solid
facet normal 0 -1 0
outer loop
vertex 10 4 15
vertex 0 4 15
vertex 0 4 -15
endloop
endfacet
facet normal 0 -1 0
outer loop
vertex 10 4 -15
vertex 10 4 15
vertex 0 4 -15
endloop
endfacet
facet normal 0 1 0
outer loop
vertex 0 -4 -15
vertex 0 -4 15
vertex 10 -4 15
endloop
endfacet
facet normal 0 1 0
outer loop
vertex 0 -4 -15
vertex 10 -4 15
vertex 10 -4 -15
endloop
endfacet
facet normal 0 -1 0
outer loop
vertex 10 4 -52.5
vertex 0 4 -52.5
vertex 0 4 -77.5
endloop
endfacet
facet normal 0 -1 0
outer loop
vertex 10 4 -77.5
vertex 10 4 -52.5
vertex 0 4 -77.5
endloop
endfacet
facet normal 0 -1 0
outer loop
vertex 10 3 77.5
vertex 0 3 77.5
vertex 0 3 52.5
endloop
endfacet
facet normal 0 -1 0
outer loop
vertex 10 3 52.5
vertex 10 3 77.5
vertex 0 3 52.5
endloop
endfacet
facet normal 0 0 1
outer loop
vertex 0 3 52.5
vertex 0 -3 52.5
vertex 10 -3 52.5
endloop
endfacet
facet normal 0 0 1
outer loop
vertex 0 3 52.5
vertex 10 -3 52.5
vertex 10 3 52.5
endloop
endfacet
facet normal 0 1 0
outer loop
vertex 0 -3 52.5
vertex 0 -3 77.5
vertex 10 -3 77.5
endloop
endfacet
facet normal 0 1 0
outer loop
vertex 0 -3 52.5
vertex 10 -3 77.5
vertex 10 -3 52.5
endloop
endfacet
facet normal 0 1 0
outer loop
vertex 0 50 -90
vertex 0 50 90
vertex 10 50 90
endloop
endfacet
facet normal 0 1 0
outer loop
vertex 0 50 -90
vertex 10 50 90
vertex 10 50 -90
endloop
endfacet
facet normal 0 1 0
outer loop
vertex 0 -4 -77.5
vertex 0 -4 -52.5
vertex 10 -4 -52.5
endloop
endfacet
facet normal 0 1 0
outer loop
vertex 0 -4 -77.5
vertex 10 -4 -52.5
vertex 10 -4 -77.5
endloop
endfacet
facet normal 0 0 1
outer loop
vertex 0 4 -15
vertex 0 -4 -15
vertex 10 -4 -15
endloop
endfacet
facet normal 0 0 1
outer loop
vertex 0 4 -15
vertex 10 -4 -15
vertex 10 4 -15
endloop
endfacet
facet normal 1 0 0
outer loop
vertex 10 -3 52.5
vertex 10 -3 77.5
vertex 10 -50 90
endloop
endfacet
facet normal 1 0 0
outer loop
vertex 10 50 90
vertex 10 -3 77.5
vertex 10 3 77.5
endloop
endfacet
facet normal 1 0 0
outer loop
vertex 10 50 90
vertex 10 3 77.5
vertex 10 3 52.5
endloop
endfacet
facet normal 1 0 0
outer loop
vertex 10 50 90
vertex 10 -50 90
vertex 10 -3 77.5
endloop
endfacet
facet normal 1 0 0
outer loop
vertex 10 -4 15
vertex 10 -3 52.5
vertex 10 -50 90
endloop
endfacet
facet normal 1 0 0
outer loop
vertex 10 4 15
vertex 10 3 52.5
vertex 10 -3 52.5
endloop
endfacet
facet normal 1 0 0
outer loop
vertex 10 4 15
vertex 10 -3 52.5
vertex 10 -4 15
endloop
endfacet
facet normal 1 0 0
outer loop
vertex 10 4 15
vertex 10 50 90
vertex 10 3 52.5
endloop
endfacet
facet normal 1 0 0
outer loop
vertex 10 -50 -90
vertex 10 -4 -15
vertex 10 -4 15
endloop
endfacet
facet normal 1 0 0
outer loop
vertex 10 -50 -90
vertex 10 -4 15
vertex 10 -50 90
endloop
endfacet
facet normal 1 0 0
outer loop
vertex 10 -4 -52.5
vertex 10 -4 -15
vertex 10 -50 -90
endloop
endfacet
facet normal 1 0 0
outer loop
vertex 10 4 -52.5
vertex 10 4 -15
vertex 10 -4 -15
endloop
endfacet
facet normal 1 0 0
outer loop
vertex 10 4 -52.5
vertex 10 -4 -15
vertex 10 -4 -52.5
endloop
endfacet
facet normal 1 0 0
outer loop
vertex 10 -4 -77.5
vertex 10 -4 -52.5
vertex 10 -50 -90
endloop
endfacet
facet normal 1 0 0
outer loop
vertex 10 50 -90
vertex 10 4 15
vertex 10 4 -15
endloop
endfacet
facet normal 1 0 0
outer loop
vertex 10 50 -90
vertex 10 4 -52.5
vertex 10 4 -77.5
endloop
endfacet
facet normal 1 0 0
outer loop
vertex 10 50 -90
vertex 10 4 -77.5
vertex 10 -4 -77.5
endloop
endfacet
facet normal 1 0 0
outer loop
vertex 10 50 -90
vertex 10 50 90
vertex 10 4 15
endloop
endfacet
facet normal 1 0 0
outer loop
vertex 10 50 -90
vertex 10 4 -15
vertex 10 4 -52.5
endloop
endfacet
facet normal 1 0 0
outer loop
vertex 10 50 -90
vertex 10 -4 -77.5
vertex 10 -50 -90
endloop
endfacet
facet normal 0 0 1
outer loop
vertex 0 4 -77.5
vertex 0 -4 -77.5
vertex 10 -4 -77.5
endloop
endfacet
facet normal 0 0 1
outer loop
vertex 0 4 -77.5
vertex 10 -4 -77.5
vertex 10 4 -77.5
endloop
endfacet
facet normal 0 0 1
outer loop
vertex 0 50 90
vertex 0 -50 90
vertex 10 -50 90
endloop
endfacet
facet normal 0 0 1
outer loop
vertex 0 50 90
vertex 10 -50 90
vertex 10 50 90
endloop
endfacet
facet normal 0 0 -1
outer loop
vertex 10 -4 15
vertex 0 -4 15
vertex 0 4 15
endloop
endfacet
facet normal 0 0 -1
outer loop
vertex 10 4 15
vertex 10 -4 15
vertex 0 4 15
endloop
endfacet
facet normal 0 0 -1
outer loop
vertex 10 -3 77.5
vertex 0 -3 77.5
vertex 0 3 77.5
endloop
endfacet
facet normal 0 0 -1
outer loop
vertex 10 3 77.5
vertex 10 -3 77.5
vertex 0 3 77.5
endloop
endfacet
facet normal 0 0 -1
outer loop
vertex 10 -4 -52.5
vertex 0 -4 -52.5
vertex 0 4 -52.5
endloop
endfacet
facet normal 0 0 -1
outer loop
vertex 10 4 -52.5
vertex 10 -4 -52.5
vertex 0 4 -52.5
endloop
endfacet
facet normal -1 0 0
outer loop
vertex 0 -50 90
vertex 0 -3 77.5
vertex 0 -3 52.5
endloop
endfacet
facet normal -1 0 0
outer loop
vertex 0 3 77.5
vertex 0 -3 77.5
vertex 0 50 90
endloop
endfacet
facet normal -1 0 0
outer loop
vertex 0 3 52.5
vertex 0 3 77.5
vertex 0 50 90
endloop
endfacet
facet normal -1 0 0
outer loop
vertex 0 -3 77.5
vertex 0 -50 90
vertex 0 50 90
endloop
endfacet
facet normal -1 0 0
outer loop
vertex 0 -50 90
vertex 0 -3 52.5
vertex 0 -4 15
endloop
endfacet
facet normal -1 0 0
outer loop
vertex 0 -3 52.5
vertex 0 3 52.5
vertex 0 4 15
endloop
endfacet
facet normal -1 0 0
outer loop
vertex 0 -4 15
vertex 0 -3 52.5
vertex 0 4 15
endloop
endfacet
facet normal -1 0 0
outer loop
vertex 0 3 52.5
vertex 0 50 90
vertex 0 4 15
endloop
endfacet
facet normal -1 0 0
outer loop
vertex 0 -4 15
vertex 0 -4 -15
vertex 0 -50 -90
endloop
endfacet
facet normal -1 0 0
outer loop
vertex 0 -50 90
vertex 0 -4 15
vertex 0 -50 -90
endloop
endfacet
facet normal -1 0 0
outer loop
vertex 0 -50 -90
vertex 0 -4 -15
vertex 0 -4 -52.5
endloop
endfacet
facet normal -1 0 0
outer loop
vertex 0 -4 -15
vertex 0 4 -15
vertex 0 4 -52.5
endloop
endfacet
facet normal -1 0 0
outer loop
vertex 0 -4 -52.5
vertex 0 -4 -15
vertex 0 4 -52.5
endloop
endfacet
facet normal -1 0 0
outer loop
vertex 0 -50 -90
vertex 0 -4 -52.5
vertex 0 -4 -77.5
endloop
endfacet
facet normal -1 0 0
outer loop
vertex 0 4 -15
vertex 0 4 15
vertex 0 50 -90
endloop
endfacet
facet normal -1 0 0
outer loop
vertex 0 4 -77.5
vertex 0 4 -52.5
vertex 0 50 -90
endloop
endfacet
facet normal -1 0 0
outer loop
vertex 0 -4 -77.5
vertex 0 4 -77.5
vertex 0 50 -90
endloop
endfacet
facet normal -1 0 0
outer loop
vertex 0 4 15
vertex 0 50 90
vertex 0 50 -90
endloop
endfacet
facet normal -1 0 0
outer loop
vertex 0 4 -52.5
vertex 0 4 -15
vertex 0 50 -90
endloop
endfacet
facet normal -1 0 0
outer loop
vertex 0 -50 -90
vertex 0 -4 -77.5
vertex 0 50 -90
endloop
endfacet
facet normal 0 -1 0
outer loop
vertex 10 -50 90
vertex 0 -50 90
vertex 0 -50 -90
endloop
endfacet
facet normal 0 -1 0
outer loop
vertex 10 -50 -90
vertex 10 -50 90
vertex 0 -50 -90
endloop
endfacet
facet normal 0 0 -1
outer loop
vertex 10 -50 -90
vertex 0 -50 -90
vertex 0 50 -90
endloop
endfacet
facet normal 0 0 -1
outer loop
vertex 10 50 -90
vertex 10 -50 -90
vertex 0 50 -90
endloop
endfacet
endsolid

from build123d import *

# Parameters (mm, degrees)
SKETCH1_W           = 180
SKETCH1_H           = 100
SKETCH1_W_2         = 30
SKETCH1_H_2         = 8
SKETCH1_W_3         = 25
SKETCH1_H_3         = 6
BOSS_EXTRUDE1_DEPTH = 10


with BuildPart() as part:
    # Sketch1 → Boss-Extrude1 (new body)
    with BuildSketch(Plane(origin=(0, 0, 0), x_dir=(0, 0, -1), z_dir=(1, 0, 0))):
        Rectangle(SKETCH1_W, SKETCH1_H)
        Rectangle(SKETCH1_W_2, SKETCH1_H_2, mode=Mode.SUBTRACT)
        with Locations((-65, 0)):
            Rectangle(SKETCH1_W_3, SKETCH1_H_3, mode=Mode.SUBTRACT)
        with Locations((65, 0)):
            Rectangle(SKETCH1_W_3, SKETCH1_H_2, mode=Mode.SUBTRACT)
    extrude(amount=BOSS_EXTRUDE1_DEPTH)


solid = part.part
